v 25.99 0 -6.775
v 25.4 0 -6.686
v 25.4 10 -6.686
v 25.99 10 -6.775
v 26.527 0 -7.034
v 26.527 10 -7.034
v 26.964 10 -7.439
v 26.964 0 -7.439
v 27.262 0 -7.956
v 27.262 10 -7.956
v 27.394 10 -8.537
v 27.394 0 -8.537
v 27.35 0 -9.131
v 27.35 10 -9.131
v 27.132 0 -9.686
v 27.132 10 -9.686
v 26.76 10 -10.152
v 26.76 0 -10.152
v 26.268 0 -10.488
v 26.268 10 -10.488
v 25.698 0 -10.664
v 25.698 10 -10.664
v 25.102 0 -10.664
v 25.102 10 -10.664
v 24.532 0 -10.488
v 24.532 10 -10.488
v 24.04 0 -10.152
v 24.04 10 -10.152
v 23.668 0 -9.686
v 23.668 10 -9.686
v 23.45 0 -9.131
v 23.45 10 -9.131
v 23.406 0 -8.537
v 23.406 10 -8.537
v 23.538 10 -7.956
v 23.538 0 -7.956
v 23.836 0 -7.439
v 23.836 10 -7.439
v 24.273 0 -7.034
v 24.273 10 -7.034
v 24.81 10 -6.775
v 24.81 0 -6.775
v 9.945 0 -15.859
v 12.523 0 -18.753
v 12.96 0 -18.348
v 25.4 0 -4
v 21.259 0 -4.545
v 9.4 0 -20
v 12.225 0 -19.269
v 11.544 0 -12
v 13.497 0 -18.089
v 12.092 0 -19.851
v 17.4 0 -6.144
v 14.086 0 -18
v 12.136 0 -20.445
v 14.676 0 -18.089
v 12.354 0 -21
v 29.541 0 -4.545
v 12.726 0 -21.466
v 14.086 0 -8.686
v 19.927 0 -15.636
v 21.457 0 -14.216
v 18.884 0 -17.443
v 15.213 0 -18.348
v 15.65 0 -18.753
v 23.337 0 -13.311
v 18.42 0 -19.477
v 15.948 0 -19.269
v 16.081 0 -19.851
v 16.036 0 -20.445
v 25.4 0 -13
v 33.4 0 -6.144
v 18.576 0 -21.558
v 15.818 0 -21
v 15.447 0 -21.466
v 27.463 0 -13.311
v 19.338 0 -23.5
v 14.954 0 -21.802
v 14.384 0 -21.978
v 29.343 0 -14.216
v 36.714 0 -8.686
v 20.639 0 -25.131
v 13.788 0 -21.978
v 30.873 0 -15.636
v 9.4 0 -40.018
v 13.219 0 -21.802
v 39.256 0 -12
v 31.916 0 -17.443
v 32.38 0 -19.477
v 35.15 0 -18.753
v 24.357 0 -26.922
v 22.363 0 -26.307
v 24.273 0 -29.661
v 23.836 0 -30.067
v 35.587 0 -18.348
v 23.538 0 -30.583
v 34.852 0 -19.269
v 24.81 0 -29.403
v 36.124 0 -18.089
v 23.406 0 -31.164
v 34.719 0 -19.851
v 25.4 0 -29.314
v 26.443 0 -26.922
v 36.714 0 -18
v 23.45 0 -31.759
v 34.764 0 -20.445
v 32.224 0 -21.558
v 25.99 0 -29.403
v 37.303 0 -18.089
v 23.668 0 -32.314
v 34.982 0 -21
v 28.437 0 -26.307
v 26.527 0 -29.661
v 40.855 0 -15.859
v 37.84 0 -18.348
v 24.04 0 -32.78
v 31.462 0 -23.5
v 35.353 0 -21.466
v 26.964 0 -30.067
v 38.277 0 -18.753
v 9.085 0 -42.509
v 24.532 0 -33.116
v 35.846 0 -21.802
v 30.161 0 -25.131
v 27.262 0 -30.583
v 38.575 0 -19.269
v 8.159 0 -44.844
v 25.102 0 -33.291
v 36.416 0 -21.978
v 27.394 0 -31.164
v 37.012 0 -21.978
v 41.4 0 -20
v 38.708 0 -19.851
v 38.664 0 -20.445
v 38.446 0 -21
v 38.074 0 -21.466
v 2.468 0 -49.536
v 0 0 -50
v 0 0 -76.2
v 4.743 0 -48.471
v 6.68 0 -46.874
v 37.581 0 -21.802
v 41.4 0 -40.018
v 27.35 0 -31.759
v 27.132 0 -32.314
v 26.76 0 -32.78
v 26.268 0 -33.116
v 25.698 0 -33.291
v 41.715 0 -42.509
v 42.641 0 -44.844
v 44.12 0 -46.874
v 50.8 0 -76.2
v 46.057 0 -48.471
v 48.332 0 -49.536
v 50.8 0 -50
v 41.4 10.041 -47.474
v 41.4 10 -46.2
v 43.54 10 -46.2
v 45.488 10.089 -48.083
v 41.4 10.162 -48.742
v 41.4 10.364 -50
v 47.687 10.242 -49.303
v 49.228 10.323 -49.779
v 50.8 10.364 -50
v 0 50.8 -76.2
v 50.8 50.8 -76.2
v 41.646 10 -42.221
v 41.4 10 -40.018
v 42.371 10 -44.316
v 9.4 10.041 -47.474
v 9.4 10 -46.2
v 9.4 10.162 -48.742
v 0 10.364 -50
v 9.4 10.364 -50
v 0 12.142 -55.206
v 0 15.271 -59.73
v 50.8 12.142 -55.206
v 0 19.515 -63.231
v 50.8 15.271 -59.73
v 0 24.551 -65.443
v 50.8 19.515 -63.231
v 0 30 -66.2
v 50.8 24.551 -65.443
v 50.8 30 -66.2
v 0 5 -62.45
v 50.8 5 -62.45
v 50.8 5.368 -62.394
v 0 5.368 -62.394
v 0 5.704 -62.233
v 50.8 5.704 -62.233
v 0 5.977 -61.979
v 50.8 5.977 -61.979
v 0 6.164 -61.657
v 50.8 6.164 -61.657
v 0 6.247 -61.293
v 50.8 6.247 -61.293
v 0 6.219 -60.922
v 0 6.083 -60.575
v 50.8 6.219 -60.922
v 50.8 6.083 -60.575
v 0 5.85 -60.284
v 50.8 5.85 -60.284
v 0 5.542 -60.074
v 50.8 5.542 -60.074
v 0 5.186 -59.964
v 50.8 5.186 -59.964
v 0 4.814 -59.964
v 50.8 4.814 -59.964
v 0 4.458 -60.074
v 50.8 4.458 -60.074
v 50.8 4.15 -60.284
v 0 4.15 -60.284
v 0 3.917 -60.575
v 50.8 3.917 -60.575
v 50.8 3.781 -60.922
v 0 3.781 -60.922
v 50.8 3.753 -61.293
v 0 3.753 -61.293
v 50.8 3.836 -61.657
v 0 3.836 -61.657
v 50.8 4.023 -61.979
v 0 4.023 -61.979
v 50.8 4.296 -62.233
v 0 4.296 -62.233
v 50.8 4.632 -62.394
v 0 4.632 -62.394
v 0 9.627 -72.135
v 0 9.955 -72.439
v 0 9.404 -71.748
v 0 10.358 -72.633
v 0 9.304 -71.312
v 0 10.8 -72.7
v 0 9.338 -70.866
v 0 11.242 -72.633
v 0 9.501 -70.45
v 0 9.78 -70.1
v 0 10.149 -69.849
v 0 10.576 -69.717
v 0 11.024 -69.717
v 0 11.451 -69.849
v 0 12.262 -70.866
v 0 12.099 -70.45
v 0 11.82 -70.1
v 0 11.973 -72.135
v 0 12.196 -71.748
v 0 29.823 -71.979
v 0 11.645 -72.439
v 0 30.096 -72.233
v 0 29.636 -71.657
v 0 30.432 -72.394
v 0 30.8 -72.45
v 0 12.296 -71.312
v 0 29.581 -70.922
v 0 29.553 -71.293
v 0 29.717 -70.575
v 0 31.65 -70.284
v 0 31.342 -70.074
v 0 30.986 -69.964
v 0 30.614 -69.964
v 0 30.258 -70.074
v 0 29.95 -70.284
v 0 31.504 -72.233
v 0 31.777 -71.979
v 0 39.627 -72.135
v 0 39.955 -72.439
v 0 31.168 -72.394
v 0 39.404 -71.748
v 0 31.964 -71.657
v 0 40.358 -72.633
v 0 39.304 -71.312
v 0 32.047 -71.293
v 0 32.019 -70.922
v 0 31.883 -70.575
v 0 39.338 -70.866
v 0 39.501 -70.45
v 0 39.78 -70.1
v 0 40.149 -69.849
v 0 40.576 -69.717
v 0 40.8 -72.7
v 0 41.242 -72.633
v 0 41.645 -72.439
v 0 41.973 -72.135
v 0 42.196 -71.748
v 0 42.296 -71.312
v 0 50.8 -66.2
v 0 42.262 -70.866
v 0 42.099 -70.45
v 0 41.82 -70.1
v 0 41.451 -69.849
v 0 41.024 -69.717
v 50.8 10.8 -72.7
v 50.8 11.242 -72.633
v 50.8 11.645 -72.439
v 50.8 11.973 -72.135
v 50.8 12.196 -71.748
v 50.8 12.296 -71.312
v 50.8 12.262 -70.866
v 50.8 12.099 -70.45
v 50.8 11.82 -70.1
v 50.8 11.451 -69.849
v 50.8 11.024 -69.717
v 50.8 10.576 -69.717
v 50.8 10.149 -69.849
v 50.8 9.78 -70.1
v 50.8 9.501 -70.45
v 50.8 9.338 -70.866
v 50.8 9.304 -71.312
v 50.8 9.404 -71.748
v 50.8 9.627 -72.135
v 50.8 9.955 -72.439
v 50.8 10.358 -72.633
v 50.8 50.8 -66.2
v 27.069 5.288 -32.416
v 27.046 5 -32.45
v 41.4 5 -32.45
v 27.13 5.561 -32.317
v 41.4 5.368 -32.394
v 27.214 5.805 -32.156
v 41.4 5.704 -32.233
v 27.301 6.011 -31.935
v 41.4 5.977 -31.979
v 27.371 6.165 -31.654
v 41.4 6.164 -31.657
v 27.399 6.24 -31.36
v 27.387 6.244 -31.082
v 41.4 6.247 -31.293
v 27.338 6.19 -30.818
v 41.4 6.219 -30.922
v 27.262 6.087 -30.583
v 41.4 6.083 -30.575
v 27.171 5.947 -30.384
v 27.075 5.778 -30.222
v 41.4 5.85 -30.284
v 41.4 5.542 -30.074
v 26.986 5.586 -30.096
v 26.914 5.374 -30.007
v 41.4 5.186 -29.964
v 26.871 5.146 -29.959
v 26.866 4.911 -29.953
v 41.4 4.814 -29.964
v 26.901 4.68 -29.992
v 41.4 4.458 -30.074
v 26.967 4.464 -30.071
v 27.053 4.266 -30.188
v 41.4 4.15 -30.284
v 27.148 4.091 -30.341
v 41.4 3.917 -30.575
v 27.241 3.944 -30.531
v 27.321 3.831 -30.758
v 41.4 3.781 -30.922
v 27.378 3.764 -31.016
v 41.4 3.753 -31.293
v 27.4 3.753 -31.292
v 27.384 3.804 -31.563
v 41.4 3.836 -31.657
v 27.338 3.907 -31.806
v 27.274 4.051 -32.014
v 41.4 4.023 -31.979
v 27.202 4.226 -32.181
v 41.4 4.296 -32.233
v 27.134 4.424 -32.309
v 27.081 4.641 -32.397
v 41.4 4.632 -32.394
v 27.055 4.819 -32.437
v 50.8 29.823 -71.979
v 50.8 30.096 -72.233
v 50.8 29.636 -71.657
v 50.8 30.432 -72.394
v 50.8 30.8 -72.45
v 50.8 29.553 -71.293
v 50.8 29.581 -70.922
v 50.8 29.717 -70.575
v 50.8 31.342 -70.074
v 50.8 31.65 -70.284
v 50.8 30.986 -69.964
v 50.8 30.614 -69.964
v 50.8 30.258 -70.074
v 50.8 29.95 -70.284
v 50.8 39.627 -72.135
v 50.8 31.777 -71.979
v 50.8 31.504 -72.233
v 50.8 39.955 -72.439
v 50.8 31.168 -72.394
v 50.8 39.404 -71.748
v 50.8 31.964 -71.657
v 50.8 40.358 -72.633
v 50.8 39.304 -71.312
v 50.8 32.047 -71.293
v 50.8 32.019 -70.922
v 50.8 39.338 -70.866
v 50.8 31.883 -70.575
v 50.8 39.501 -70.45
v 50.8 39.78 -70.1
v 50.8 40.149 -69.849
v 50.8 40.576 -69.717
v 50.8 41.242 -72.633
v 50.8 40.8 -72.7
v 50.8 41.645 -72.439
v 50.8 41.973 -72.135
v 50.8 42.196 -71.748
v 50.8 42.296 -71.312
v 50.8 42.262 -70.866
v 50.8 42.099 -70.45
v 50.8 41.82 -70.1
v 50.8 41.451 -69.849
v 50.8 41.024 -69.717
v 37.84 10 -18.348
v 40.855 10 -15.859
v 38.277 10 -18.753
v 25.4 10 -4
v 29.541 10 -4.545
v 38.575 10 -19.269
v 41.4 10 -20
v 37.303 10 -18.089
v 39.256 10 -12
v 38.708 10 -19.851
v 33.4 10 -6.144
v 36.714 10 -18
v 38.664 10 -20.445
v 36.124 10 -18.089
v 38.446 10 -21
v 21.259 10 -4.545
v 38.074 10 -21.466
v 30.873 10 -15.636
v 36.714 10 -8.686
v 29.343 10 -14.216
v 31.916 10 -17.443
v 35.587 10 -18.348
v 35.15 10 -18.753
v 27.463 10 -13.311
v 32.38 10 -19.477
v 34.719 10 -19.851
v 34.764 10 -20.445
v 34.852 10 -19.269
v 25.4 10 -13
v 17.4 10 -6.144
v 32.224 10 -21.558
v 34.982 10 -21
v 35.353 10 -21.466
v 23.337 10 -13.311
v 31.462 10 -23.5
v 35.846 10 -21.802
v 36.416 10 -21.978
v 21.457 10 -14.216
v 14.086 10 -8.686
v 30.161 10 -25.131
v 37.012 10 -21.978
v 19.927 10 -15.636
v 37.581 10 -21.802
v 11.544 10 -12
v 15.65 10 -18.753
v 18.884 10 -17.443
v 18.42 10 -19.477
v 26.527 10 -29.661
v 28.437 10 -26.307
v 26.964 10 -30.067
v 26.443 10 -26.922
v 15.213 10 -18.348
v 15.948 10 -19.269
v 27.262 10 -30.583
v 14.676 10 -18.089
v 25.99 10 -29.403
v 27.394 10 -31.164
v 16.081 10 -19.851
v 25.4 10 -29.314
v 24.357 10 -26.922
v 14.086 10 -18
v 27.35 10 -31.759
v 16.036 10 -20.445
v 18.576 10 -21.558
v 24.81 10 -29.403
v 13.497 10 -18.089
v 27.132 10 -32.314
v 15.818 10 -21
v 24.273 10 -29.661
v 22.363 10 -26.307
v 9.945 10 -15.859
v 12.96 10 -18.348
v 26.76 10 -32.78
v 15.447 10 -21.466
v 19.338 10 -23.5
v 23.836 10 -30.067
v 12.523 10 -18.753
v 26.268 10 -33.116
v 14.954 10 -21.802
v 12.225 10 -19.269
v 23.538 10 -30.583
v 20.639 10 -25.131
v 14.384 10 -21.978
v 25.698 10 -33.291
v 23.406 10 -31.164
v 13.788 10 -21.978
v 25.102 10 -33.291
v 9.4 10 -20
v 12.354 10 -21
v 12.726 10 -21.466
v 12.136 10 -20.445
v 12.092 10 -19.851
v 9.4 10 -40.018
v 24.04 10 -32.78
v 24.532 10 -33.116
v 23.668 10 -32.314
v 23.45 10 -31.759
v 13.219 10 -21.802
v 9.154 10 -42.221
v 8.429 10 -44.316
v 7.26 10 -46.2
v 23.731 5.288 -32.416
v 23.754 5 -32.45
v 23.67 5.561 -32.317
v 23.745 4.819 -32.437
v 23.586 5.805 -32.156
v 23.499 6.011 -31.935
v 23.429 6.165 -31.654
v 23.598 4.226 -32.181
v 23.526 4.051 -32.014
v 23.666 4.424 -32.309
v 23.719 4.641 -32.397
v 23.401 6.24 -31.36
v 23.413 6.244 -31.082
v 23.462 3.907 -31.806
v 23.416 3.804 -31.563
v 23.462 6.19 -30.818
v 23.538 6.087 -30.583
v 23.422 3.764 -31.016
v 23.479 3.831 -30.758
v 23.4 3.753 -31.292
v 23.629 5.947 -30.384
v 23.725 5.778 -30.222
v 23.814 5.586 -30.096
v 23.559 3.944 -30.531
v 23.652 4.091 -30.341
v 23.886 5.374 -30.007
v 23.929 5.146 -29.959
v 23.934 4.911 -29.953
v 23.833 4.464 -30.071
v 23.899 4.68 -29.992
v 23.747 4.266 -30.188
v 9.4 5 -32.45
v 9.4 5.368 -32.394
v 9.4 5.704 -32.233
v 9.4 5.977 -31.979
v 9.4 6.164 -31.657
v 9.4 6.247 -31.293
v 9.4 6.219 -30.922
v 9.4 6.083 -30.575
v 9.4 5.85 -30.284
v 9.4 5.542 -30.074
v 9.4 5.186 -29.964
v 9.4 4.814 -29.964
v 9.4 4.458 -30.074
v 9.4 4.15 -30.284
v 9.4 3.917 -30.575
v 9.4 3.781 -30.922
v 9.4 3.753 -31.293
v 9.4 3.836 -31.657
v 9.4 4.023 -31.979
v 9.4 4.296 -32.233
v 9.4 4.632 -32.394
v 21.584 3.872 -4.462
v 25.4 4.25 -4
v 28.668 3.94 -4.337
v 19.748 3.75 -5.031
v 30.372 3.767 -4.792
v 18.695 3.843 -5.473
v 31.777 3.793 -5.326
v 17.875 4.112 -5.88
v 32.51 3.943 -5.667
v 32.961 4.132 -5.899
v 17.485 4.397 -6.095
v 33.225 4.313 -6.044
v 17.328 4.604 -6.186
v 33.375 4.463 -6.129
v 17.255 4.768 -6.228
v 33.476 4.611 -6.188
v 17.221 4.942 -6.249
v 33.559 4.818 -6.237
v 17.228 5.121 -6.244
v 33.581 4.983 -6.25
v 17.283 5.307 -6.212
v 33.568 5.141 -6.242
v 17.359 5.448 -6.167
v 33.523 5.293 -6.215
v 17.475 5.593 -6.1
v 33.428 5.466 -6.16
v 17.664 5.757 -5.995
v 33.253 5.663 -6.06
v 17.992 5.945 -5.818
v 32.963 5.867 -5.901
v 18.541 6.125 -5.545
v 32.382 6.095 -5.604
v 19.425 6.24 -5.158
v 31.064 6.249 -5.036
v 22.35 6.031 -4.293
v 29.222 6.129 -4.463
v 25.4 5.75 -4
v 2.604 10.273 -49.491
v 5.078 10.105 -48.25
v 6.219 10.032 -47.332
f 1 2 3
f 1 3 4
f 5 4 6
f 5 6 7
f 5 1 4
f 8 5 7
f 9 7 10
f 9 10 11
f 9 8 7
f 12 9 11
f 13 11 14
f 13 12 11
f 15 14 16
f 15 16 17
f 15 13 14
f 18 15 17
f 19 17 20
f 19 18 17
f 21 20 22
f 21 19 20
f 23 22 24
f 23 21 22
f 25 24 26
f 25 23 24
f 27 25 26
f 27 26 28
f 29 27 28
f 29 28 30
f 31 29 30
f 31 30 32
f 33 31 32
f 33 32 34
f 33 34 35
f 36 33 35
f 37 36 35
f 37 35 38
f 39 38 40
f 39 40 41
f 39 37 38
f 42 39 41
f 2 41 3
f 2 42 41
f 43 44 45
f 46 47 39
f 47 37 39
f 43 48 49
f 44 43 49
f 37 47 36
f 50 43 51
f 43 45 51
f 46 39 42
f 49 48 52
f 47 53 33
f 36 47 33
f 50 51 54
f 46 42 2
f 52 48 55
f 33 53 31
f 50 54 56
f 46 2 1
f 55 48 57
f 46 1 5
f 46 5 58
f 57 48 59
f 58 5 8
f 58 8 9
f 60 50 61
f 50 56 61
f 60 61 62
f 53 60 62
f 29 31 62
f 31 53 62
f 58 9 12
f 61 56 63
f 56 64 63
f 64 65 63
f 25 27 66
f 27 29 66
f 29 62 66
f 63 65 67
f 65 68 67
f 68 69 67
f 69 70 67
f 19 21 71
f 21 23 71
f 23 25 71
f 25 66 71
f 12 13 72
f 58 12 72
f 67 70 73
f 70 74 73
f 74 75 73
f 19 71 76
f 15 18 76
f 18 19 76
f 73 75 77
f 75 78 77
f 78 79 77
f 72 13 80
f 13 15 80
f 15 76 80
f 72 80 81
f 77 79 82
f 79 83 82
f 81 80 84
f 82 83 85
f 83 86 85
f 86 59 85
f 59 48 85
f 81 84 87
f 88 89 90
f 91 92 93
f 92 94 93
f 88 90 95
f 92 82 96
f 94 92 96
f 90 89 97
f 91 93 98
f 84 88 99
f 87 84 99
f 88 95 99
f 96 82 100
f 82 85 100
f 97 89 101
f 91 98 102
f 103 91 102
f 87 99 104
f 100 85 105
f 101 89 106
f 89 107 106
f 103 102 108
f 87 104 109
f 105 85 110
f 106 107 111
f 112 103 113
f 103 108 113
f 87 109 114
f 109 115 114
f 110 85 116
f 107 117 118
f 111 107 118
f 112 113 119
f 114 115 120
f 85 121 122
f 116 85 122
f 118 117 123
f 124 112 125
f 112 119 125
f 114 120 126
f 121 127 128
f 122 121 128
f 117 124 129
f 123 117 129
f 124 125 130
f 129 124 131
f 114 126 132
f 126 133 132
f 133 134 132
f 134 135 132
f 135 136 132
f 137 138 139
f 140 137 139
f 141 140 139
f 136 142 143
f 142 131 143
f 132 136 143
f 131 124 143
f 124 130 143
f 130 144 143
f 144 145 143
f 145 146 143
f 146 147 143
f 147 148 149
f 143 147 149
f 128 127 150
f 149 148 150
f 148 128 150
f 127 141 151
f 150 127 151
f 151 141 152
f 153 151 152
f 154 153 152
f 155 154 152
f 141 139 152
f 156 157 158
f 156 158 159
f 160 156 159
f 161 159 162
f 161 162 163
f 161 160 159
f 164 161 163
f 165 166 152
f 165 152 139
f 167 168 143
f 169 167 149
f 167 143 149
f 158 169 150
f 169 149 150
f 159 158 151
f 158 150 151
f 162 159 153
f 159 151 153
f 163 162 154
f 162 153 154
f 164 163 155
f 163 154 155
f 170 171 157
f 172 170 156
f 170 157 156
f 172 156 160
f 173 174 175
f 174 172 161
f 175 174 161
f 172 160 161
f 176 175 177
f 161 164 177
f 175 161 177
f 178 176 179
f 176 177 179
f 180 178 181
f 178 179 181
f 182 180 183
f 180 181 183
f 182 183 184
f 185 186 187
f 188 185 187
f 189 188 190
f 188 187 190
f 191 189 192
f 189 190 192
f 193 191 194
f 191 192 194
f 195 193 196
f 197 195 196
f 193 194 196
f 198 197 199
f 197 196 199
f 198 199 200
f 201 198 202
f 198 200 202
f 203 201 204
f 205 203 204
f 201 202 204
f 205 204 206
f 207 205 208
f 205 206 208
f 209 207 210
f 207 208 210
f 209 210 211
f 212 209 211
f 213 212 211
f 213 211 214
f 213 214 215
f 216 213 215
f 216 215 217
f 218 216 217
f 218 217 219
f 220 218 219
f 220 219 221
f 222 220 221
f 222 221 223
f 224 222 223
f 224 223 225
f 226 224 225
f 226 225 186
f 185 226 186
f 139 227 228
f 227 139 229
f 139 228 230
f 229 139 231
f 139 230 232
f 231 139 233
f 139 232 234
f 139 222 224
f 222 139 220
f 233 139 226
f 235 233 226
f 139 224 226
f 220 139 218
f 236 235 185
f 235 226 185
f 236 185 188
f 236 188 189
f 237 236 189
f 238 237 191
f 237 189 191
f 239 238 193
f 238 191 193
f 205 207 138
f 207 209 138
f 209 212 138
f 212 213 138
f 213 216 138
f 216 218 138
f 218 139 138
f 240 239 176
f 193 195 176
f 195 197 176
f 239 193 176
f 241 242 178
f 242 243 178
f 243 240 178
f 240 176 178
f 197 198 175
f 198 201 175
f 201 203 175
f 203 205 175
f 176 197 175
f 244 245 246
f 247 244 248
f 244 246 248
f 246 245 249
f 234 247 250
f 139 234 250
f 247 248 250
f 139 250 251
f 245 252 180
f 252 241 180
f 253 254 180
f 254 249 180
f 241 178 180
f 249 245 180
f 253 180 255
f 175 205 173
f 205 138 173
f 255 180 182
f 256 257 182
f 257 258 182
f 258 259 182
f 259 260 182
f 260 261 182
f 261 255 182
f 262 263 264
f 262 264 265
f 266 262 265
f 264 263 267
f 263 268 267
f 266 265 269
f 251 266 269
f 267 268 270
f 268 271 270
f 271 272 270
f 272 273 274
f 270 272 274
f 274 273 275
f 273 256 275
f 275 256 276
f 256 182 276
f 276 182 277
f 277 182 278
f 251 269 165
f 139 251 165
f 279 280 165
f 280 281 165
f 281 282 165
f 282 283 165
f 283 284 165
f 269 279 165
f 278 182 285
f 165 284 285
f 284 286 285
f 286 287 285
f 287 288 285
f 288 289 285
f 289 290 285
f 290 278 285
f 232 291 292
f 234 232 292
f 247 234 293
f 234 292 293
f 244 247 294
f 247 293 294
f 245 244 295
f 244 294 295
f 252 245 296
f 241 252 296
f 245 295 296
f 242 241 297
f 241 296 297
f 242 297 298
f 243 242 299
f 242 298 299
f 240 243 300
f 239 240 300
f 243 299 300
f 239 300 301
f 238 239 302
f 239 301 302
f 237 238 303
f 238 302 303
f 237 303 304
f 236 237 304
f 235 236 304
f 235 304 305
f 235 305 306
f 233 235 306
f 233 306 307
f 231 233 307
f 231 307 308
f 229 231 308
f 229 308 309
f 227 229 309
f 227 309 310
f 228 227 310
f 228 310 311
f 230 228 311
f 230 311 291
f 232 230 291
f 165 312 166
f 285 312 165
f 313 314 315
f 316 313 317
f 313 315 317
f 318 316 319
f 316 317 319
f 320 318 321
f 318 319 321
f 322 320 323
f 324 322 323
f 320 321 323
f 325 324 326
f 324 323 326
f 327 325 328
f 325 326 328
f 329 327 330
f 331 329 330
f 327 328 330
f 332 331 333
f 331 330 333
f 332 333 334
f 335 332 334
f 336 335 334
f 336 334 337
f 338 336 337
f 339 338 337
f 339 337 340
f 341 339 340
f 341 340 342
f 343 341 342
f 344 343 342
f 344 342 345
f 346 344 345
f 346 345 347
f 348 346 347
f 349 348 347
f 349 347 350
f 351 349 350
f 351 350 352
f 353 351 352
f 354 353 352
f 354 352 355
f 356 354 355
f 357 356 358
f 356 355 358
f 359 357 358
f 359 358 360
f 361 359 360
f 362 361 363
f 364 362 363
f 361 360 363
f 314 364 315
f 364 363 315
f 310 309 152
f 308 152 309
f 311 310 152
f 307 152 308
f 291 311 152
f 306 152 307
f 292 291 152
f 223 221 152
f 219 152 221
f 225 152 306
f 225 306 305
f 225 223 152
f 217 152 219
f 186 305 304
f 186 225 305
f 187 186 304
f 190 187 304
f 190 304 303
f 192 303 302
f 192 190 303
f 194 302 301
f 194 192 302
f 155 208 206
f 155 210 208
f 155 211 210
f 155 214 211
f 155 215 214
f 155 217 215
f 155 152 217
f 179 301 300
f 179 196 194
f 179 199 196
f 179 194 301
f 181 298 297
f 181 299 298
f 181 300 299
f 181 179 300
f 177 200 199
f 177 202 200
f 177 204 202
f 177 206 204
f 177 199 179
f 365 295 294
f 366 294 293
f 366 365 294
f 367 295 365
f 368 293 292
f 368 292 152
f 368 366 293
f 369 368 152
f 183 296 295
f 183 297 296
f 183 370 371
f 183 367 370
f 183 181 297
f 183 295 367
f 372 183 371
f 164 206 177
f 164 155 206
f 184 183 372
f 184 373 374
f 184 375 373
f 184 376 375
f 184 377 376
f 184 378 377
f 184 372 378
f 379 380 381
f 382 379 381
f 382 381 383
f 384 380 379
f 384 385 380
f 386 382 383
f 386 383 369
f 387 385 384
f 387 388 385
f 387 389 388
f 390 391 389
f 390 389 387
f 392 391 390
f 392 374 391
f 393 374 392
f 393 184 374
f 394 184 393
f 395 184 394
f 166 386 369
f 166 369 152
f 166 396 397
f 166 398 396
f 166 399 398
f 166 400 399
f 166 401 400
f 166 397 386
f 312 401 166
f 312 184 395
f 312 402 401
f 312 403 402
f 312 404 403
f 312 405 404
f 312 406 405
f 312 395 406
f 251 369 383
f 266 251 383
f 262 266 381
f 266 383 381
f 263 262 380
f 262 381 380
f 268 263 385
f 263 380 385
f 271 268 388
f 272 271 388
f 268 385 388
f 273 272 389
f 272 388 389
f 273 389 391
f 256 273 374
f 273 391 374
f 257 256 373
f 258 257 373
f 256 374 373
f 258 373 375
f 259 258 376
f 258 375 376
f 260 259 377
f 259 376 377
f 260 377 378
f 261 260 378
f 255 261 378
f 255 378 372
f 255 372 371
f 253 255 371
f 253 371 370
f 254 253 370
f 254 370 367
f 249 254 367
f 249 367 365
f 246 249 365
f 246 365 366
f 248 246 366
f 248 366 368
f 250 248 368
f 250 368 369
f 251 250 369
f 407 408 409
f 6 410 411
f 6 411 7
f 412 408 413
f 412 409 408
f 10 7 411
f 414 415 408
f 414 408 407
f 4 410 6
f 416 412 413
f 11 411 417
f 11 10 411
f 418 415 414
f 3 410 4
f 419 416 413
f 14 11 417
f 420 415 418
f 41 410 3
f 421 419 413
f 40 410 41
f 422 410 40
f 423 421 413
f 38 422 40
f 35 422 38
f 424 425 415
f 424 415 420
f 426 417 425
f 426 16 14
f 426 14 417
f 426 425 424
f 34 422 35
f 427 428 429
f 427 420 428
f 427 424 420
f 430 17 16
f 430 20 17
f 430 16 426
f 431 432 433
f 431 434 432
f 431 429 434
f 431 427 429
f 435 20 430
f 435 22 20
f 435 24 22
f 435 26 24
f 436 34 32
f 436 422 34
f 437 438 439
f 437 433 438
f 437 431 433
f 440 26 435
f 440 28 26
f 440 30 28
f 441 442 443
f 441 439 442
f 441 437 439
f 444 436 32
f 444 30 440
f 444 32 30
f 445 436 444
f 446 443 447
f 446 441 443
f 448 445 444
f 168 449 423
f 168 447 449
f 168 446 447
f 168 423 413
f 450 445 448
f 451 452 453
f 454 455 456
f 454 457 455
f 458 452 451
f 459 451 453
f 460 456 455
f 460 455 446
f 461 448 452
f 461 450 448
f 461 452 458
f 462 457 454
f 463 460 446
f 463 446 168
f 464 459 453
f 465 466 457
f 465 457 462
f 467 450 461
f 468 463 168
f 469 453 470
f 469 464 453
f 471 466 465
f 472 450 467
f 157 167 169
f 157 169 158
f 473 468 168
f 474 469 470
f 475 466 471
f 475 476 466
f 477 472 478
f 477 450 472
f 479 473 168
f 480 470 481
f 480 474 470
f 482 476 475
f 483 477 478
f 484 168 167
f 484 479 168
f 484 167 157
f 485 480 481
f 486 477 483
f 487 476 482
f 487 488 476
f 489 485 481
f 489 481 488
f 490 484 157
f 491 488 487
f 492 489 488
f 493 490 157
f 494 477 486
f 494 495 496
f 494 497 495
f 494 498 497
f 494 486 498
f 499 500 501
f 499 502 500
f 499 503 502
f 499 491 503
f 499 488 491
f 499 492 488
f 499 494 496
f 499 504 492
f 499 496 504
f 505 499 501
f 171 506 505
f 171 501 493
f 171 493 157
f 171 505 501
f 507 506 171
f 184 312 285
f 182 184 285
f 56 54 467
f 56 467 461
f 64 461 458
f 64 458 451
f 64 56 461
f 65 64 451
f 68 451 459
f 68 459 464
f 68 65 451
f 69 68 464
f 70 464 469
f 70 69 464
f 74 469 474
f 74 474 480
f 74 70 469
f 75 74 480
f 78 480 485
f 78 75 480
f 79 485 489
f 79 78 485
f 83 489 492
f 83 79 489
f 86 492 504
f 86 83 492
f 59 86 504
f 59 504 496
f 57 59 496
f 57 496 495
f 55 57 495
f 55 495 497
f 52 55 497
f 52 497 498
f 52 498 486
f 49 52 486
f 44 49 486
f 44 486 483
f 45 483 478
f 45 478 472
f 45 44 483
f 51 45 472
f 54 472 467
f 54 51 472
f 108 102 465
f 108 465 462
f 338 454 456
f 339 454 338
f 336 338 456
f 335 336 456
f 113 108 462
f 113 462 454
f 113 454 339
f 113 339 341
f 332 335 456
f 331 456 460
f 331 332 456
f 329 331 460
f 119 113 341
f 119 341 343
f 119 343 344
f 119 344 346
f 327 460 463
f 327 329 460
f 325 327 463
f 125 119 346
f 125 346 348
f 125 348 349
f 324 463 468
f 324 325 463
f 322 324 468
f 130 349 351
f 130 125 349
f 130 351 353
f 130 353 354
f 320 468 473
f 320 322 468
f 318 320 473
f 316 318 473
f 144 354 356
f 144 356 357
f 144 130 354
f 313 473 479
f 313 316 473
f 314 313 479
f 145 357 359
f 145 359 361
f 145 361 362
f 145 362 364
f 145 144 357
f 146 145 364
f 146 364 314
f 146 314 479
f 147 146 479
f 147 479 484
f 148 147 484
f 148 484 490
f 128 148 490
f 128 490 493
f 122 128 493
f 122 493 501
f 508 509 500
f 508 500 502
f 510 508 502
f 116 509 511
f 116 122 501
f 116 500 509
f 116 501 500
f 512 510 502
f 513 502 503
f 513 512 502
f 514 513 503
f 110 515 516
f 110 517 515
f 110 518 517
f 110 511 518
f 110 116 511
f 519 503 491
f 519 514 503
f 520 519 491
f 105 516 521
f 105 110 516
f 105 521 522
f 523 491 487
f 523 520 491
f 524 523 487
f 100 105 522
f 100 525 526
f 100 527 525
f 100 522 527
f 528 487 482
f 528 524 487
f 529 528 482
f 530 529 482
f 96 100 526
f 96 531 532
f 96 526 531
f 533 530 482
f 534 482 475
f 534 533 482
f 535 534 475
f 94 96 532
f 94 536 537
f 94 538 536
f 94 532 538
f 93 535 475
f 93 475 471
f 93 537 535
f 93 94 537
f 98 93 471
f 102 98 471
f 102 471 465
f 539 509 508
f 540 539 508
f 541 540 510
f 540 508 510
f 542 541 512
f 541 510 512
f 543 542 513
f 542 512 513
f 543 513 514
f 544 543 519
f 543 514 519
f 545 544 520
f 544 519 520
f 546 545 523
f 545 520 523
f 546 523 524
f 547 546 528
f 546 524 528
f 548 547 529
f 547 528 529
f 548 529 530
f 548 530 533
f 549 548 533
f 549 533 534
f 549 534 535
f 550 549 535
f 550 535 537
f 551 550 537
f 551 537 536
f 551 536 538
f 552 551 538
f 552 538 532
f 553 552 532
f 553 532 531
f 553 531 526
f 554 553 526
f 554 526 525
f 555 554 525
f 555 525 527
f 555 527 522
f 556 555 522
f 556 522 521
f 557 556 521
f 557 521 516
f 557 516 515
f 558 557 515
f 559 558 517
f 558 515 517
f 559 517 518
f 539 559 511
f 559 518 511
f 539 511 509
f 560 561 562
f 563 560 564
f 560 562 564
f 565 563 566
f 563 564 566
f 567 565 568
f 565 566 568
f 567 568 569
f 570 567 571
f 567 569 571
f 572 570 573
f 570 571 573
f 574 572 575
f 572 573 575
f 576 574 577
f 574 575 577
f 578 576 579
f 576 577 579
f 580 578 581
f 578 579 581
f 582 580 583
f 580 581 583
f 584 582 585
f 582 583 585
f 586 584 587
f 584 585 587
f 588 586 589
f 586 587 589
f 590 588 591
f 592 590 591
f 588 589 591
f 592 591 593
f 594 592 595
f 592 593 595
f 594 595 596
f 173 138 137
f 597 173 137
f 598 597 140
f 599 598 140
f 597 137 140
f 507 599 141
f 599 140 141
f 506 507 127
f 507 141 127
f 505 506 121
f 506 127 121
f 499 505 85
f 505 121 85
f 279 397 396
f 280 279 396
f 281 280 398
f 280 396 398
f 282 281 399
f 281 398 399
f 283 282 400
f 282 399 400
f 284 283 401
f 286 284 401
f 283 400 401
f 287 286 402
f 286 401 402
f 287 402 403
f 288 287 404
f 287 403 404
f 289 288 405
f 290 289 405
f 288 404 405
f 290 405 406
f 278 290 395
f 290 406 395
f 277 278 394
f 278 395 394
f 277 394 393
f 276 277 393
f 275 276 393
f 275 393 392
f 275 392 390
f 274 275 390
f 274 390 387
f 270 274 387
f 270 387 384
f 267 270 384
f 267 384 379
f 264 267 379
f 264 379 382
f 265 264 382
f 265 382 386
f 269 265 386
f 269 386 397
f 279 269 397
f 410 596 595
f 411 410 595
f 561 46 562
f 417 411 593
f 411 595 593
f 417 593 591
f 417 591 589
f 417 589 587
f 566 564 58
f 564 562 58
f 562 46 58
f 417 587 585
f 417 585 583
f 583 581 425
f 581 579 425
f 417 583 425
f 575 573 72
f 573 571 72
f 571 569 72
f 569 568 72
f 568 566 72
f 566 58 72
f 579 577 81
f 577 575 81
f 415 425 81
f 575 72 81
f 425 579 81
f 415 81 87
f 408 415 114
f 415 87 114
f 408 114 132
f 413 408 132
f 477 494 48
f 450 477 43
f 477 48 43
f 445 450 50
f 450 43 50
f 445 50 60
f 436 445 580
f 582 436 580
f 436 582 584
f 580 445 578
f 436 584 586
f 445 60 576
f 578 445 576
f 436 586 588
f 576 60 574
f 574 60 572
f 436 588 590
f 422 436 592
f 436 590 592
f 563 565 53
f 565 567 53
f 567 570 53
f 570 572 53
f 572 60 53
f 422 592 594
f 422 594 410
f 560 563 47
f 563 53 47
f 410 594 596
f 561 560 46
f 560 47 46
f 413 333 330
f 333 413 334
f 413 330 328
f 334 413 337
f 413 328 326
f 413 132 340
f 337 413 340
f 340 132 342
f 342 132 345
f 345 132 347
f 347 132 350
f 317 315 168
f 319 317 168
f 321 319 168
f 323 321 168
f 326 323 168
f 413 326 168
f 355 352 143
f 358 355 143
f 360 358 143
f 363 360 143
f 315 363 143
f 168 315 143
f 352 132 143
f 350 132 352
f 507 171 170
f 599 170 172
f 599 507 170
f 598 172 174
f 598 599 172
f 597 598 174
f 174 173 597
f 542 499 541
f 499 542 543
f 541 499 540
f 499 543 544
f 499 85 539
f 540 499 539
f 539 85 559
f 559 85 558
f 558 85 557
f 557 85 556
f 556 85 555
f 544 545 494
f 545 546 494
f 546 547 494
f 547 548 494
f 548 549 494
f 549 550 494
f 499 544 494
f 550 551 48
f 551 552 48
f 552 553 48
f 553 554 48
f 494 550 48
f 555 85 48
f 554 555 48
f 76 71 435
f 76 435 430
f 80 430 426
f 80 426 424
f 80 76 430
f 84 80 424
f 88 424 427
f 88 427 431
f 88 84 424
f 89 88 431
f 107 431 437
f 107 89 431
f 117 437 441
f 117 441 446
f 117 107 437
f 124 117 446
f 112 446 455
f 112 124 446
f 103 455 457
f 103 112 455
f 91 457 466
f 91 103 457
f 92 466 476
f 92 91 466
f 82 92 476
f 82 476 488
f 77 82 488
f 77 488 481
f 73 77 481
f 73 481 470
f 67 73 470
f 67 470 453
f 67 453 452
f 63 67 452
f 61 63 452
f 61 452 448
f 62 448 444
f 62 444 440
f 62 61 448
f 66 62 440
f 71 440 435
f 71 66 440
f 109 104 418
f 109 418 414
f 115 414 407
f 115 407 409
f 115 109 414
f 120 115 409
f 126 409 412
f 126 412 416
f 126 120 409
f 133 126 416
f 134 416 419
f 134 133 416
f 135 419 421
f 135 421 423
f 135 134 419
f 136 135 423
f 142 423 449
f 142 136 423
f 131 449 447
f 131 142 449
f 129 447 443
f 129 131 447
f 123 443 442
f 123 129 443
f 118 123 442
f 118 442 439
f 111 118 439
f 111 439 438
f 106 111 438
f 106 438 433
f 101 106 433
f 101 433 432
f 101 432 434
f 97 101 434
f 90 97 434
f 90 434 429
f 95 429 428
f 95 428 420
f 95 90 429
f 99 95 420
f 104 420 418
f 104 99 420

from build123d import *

# Parameters (mm, degrees)
SKETCH1_W           = 50.8
SKETCH1_H           = 66.2
SKETCH1_R           = 2
SKETCH1_R_2         = 7
BOSS_EXTRUDE1_DEPTH = 10
SKETCH2_W           = 50.8
SKETCH2_H           = 50.8
BOSS_EXTRUDE2_DEPTH = 10
FILLET2_R           = 20
SKETCH3_R           = 1.25
CUT_EXTRUDE1_DEPTH  = 105.726882891
SKETCH4_R           = 1.25
SKETCH4_R_2         = 1.5
CUT_EXTRUDE2_DEPTH  = 105.726882939
CUT_EXTRUDE3_DEPTH  = 105.726882939
FILLET3_DEPTH       = 10.364318194
FILLET3_START       = -1
FILLET3_2_DEPTH     = 53


with BuildPart() as part:
    # Sketch1 → Boss-Extrude1 (new body)
    with BuildSketch(Plane(origin=(0, 0, 0), x_dir=(1, 0, 0), z_dir=(0, 1, 0))):
        with Locations((25.4, 33.1)):
            Rectangle(SKETCH1_W, SKETCH1_H)
        with Locations(Location((14.086291501, 20, 0), (0, 0, 270))):
            Circle(SKETCH1_R, mode=Mode.SUBTRACT)
        with Locations(Location((25.4, 8.686291501, 0), (0, 0, 270))):
            Circle(SKETCH1_R, mode=Mode.SUBTRACT)
        with Locations(Location((36.713708499, 20, 0), (0, 0, 270))):
            Circle(SKETCH1_R, mode=Mode.SUBTRACT)
        with Locations(Location((25.4, 31.313708499, 0), (0, 0, 270))):
            Circle(SKETCH1_R, mode=Mode.SUBTRACT)
        with Locations(Location((25.4, 20, 0), (0, 0, 270))):
            Circle(SKETCH1_R_2, mode=Mode.SUBTRACT)
    extrude(amount=BOSS_EXTRUDE1_DEPTH)

    # Sketch2 → Boss-Extrude2 (add)
    with BuildSketch(Plane(origin=(0, 0, -66.2), x_dir=(-1, 0, 0), z_dir=(0, 0, -1))):
        with Locations((-25.4, 25.4)):
            Rectangle(SKETCH2_W, SKETCH2_H)
    extrude(amount=BOSS_EXTRUDE2_DEPTH)

    # Fillet2
    fillet2_edges = [part.edges().sort_by_distance(p)[0] for p in [
        (25.4, 10, -66.2),
    ]]
    fillet(fillet2_edges, radius=FILLET2_R)

    # Sketch3 → Cut-Extrude1 (cut, through all)
    with BuildSketch(Plane(origin=(50.8, 0, 0), x_dir=(0, 0, -1), z_dir=(1, 0, 0))):
        with Locations((61.2, 5)):
            Circle(SKETCH3_R)
        with Locations((31.2, 5)):
            Circle(SKETCH3_R)
        with Locations((5, 5)):
            Circle(SKETCH3_R)
    extrude(amount=-CUT_EXTRUDE1_DEPTH, mode=Mode.SUBTRACT)

    # Sketch4 → Cut-Extrude2 (cut, through all)
    with BuildSketch(Plane(origin=(50.8, 0, 0), x_dir=(0, 0, -1), z_dir=(1, 0, 0))):
        with Locations((71.2, -9.2)):
            Circle(SKETCH4_R)
        with Locations((71.2, 30.8)):
            Circle(SKETCH4_R)
        with Locations((71.2, 10.8)):
            Circle(SKETCH4_R_2)
        with Locations((71.2, 40.8)):
            Circle(SKETCH4_R_2)
    extrude(amount=-CUT_EXTRUDE2_DEPTH, mode=Mode.SUBTRACT)

    # Sketch5 → Cut-Extrude3 (cut, through all)
    with BuildSketch(Plane(origin=(0, 0, 0), x_dir=(-1, 0, 0), z_dir=(0, -1, 0))):
        with BuildLine():
            ThreePointArc((-25.4, 4), (-36.713708499, 8.686291501), (-41.4, 20))
            Line((-41.4, 20), (-41.4, 50))
            Line((-41.4, 50), (-50.8, 50))
            Line((-50.8, 50), (-50.8, 0))
            Line((-50.8, 0), (0, 0))
            Line((0, 0), (0, 50))
            Line((0, 50), (-9.4, 50))
            Line((-9.4, 50), (-9.4, 20))
            ThreePointArc((-9.4, 20), (-14.086291501, 8.686291501), (-25.4, 4))
        make_face()
    extrude(amount=-CUT_EXTRUDE3_DEPTH, mode=Mode.SUBTRACT)

    # Fillet3: read off the stored shape, not the designer's step
    # Fillet3 outline → Fillet3 (add)
    with BuildSketch(Plane(origin=(0, 0, 0), x_dir=(1, 0, 0), z_dir=(0, 1, 0))):
        with BuildLine():
            ThreePointArc((0, 50), (6.680109889, 46.87367083), (9.4, 40.018016229))
            Line((9.4, 40.018016229), (9.4, 50))
            Line((9.4, 50), (0, 50))
        make_face()
        with BuildLine():
            ThreePointArc((41.4, 40.018016229), (44.119890111, 46.87367083), (50.8, 50))
            Line((50.8, 50), (41.4, 50))
            Line((41.4, 50), (41.4, 40.018016229))
        make_face()
    extrude(amount=FILLET3_DEPTH)

    # Fillet3 2 outline → Fillet3 2 (cut)
    with BuildSketch(Plane.YZ.offset(FILLET3_START)):
        with BuildLine():
            ThreePointArc((10, -46.2), (10.091287885, -48.108712115), (10.364318194, -50))
            ThreePointArc((10.364318194, -50), (10.586120766, -51.006380458), (10.859467092, -52))
            Line((10.859467092, -52), (12, -52))
            Line((12, -52), (12, -39))
            Line((12, -39), (10, -39))
            Line((10, -39), (10, -46.2))
        make_face()
    extrude(amount=FILLET3_2_DEPTH, mode=Mode.SUBTRACT)


solid = part.part
